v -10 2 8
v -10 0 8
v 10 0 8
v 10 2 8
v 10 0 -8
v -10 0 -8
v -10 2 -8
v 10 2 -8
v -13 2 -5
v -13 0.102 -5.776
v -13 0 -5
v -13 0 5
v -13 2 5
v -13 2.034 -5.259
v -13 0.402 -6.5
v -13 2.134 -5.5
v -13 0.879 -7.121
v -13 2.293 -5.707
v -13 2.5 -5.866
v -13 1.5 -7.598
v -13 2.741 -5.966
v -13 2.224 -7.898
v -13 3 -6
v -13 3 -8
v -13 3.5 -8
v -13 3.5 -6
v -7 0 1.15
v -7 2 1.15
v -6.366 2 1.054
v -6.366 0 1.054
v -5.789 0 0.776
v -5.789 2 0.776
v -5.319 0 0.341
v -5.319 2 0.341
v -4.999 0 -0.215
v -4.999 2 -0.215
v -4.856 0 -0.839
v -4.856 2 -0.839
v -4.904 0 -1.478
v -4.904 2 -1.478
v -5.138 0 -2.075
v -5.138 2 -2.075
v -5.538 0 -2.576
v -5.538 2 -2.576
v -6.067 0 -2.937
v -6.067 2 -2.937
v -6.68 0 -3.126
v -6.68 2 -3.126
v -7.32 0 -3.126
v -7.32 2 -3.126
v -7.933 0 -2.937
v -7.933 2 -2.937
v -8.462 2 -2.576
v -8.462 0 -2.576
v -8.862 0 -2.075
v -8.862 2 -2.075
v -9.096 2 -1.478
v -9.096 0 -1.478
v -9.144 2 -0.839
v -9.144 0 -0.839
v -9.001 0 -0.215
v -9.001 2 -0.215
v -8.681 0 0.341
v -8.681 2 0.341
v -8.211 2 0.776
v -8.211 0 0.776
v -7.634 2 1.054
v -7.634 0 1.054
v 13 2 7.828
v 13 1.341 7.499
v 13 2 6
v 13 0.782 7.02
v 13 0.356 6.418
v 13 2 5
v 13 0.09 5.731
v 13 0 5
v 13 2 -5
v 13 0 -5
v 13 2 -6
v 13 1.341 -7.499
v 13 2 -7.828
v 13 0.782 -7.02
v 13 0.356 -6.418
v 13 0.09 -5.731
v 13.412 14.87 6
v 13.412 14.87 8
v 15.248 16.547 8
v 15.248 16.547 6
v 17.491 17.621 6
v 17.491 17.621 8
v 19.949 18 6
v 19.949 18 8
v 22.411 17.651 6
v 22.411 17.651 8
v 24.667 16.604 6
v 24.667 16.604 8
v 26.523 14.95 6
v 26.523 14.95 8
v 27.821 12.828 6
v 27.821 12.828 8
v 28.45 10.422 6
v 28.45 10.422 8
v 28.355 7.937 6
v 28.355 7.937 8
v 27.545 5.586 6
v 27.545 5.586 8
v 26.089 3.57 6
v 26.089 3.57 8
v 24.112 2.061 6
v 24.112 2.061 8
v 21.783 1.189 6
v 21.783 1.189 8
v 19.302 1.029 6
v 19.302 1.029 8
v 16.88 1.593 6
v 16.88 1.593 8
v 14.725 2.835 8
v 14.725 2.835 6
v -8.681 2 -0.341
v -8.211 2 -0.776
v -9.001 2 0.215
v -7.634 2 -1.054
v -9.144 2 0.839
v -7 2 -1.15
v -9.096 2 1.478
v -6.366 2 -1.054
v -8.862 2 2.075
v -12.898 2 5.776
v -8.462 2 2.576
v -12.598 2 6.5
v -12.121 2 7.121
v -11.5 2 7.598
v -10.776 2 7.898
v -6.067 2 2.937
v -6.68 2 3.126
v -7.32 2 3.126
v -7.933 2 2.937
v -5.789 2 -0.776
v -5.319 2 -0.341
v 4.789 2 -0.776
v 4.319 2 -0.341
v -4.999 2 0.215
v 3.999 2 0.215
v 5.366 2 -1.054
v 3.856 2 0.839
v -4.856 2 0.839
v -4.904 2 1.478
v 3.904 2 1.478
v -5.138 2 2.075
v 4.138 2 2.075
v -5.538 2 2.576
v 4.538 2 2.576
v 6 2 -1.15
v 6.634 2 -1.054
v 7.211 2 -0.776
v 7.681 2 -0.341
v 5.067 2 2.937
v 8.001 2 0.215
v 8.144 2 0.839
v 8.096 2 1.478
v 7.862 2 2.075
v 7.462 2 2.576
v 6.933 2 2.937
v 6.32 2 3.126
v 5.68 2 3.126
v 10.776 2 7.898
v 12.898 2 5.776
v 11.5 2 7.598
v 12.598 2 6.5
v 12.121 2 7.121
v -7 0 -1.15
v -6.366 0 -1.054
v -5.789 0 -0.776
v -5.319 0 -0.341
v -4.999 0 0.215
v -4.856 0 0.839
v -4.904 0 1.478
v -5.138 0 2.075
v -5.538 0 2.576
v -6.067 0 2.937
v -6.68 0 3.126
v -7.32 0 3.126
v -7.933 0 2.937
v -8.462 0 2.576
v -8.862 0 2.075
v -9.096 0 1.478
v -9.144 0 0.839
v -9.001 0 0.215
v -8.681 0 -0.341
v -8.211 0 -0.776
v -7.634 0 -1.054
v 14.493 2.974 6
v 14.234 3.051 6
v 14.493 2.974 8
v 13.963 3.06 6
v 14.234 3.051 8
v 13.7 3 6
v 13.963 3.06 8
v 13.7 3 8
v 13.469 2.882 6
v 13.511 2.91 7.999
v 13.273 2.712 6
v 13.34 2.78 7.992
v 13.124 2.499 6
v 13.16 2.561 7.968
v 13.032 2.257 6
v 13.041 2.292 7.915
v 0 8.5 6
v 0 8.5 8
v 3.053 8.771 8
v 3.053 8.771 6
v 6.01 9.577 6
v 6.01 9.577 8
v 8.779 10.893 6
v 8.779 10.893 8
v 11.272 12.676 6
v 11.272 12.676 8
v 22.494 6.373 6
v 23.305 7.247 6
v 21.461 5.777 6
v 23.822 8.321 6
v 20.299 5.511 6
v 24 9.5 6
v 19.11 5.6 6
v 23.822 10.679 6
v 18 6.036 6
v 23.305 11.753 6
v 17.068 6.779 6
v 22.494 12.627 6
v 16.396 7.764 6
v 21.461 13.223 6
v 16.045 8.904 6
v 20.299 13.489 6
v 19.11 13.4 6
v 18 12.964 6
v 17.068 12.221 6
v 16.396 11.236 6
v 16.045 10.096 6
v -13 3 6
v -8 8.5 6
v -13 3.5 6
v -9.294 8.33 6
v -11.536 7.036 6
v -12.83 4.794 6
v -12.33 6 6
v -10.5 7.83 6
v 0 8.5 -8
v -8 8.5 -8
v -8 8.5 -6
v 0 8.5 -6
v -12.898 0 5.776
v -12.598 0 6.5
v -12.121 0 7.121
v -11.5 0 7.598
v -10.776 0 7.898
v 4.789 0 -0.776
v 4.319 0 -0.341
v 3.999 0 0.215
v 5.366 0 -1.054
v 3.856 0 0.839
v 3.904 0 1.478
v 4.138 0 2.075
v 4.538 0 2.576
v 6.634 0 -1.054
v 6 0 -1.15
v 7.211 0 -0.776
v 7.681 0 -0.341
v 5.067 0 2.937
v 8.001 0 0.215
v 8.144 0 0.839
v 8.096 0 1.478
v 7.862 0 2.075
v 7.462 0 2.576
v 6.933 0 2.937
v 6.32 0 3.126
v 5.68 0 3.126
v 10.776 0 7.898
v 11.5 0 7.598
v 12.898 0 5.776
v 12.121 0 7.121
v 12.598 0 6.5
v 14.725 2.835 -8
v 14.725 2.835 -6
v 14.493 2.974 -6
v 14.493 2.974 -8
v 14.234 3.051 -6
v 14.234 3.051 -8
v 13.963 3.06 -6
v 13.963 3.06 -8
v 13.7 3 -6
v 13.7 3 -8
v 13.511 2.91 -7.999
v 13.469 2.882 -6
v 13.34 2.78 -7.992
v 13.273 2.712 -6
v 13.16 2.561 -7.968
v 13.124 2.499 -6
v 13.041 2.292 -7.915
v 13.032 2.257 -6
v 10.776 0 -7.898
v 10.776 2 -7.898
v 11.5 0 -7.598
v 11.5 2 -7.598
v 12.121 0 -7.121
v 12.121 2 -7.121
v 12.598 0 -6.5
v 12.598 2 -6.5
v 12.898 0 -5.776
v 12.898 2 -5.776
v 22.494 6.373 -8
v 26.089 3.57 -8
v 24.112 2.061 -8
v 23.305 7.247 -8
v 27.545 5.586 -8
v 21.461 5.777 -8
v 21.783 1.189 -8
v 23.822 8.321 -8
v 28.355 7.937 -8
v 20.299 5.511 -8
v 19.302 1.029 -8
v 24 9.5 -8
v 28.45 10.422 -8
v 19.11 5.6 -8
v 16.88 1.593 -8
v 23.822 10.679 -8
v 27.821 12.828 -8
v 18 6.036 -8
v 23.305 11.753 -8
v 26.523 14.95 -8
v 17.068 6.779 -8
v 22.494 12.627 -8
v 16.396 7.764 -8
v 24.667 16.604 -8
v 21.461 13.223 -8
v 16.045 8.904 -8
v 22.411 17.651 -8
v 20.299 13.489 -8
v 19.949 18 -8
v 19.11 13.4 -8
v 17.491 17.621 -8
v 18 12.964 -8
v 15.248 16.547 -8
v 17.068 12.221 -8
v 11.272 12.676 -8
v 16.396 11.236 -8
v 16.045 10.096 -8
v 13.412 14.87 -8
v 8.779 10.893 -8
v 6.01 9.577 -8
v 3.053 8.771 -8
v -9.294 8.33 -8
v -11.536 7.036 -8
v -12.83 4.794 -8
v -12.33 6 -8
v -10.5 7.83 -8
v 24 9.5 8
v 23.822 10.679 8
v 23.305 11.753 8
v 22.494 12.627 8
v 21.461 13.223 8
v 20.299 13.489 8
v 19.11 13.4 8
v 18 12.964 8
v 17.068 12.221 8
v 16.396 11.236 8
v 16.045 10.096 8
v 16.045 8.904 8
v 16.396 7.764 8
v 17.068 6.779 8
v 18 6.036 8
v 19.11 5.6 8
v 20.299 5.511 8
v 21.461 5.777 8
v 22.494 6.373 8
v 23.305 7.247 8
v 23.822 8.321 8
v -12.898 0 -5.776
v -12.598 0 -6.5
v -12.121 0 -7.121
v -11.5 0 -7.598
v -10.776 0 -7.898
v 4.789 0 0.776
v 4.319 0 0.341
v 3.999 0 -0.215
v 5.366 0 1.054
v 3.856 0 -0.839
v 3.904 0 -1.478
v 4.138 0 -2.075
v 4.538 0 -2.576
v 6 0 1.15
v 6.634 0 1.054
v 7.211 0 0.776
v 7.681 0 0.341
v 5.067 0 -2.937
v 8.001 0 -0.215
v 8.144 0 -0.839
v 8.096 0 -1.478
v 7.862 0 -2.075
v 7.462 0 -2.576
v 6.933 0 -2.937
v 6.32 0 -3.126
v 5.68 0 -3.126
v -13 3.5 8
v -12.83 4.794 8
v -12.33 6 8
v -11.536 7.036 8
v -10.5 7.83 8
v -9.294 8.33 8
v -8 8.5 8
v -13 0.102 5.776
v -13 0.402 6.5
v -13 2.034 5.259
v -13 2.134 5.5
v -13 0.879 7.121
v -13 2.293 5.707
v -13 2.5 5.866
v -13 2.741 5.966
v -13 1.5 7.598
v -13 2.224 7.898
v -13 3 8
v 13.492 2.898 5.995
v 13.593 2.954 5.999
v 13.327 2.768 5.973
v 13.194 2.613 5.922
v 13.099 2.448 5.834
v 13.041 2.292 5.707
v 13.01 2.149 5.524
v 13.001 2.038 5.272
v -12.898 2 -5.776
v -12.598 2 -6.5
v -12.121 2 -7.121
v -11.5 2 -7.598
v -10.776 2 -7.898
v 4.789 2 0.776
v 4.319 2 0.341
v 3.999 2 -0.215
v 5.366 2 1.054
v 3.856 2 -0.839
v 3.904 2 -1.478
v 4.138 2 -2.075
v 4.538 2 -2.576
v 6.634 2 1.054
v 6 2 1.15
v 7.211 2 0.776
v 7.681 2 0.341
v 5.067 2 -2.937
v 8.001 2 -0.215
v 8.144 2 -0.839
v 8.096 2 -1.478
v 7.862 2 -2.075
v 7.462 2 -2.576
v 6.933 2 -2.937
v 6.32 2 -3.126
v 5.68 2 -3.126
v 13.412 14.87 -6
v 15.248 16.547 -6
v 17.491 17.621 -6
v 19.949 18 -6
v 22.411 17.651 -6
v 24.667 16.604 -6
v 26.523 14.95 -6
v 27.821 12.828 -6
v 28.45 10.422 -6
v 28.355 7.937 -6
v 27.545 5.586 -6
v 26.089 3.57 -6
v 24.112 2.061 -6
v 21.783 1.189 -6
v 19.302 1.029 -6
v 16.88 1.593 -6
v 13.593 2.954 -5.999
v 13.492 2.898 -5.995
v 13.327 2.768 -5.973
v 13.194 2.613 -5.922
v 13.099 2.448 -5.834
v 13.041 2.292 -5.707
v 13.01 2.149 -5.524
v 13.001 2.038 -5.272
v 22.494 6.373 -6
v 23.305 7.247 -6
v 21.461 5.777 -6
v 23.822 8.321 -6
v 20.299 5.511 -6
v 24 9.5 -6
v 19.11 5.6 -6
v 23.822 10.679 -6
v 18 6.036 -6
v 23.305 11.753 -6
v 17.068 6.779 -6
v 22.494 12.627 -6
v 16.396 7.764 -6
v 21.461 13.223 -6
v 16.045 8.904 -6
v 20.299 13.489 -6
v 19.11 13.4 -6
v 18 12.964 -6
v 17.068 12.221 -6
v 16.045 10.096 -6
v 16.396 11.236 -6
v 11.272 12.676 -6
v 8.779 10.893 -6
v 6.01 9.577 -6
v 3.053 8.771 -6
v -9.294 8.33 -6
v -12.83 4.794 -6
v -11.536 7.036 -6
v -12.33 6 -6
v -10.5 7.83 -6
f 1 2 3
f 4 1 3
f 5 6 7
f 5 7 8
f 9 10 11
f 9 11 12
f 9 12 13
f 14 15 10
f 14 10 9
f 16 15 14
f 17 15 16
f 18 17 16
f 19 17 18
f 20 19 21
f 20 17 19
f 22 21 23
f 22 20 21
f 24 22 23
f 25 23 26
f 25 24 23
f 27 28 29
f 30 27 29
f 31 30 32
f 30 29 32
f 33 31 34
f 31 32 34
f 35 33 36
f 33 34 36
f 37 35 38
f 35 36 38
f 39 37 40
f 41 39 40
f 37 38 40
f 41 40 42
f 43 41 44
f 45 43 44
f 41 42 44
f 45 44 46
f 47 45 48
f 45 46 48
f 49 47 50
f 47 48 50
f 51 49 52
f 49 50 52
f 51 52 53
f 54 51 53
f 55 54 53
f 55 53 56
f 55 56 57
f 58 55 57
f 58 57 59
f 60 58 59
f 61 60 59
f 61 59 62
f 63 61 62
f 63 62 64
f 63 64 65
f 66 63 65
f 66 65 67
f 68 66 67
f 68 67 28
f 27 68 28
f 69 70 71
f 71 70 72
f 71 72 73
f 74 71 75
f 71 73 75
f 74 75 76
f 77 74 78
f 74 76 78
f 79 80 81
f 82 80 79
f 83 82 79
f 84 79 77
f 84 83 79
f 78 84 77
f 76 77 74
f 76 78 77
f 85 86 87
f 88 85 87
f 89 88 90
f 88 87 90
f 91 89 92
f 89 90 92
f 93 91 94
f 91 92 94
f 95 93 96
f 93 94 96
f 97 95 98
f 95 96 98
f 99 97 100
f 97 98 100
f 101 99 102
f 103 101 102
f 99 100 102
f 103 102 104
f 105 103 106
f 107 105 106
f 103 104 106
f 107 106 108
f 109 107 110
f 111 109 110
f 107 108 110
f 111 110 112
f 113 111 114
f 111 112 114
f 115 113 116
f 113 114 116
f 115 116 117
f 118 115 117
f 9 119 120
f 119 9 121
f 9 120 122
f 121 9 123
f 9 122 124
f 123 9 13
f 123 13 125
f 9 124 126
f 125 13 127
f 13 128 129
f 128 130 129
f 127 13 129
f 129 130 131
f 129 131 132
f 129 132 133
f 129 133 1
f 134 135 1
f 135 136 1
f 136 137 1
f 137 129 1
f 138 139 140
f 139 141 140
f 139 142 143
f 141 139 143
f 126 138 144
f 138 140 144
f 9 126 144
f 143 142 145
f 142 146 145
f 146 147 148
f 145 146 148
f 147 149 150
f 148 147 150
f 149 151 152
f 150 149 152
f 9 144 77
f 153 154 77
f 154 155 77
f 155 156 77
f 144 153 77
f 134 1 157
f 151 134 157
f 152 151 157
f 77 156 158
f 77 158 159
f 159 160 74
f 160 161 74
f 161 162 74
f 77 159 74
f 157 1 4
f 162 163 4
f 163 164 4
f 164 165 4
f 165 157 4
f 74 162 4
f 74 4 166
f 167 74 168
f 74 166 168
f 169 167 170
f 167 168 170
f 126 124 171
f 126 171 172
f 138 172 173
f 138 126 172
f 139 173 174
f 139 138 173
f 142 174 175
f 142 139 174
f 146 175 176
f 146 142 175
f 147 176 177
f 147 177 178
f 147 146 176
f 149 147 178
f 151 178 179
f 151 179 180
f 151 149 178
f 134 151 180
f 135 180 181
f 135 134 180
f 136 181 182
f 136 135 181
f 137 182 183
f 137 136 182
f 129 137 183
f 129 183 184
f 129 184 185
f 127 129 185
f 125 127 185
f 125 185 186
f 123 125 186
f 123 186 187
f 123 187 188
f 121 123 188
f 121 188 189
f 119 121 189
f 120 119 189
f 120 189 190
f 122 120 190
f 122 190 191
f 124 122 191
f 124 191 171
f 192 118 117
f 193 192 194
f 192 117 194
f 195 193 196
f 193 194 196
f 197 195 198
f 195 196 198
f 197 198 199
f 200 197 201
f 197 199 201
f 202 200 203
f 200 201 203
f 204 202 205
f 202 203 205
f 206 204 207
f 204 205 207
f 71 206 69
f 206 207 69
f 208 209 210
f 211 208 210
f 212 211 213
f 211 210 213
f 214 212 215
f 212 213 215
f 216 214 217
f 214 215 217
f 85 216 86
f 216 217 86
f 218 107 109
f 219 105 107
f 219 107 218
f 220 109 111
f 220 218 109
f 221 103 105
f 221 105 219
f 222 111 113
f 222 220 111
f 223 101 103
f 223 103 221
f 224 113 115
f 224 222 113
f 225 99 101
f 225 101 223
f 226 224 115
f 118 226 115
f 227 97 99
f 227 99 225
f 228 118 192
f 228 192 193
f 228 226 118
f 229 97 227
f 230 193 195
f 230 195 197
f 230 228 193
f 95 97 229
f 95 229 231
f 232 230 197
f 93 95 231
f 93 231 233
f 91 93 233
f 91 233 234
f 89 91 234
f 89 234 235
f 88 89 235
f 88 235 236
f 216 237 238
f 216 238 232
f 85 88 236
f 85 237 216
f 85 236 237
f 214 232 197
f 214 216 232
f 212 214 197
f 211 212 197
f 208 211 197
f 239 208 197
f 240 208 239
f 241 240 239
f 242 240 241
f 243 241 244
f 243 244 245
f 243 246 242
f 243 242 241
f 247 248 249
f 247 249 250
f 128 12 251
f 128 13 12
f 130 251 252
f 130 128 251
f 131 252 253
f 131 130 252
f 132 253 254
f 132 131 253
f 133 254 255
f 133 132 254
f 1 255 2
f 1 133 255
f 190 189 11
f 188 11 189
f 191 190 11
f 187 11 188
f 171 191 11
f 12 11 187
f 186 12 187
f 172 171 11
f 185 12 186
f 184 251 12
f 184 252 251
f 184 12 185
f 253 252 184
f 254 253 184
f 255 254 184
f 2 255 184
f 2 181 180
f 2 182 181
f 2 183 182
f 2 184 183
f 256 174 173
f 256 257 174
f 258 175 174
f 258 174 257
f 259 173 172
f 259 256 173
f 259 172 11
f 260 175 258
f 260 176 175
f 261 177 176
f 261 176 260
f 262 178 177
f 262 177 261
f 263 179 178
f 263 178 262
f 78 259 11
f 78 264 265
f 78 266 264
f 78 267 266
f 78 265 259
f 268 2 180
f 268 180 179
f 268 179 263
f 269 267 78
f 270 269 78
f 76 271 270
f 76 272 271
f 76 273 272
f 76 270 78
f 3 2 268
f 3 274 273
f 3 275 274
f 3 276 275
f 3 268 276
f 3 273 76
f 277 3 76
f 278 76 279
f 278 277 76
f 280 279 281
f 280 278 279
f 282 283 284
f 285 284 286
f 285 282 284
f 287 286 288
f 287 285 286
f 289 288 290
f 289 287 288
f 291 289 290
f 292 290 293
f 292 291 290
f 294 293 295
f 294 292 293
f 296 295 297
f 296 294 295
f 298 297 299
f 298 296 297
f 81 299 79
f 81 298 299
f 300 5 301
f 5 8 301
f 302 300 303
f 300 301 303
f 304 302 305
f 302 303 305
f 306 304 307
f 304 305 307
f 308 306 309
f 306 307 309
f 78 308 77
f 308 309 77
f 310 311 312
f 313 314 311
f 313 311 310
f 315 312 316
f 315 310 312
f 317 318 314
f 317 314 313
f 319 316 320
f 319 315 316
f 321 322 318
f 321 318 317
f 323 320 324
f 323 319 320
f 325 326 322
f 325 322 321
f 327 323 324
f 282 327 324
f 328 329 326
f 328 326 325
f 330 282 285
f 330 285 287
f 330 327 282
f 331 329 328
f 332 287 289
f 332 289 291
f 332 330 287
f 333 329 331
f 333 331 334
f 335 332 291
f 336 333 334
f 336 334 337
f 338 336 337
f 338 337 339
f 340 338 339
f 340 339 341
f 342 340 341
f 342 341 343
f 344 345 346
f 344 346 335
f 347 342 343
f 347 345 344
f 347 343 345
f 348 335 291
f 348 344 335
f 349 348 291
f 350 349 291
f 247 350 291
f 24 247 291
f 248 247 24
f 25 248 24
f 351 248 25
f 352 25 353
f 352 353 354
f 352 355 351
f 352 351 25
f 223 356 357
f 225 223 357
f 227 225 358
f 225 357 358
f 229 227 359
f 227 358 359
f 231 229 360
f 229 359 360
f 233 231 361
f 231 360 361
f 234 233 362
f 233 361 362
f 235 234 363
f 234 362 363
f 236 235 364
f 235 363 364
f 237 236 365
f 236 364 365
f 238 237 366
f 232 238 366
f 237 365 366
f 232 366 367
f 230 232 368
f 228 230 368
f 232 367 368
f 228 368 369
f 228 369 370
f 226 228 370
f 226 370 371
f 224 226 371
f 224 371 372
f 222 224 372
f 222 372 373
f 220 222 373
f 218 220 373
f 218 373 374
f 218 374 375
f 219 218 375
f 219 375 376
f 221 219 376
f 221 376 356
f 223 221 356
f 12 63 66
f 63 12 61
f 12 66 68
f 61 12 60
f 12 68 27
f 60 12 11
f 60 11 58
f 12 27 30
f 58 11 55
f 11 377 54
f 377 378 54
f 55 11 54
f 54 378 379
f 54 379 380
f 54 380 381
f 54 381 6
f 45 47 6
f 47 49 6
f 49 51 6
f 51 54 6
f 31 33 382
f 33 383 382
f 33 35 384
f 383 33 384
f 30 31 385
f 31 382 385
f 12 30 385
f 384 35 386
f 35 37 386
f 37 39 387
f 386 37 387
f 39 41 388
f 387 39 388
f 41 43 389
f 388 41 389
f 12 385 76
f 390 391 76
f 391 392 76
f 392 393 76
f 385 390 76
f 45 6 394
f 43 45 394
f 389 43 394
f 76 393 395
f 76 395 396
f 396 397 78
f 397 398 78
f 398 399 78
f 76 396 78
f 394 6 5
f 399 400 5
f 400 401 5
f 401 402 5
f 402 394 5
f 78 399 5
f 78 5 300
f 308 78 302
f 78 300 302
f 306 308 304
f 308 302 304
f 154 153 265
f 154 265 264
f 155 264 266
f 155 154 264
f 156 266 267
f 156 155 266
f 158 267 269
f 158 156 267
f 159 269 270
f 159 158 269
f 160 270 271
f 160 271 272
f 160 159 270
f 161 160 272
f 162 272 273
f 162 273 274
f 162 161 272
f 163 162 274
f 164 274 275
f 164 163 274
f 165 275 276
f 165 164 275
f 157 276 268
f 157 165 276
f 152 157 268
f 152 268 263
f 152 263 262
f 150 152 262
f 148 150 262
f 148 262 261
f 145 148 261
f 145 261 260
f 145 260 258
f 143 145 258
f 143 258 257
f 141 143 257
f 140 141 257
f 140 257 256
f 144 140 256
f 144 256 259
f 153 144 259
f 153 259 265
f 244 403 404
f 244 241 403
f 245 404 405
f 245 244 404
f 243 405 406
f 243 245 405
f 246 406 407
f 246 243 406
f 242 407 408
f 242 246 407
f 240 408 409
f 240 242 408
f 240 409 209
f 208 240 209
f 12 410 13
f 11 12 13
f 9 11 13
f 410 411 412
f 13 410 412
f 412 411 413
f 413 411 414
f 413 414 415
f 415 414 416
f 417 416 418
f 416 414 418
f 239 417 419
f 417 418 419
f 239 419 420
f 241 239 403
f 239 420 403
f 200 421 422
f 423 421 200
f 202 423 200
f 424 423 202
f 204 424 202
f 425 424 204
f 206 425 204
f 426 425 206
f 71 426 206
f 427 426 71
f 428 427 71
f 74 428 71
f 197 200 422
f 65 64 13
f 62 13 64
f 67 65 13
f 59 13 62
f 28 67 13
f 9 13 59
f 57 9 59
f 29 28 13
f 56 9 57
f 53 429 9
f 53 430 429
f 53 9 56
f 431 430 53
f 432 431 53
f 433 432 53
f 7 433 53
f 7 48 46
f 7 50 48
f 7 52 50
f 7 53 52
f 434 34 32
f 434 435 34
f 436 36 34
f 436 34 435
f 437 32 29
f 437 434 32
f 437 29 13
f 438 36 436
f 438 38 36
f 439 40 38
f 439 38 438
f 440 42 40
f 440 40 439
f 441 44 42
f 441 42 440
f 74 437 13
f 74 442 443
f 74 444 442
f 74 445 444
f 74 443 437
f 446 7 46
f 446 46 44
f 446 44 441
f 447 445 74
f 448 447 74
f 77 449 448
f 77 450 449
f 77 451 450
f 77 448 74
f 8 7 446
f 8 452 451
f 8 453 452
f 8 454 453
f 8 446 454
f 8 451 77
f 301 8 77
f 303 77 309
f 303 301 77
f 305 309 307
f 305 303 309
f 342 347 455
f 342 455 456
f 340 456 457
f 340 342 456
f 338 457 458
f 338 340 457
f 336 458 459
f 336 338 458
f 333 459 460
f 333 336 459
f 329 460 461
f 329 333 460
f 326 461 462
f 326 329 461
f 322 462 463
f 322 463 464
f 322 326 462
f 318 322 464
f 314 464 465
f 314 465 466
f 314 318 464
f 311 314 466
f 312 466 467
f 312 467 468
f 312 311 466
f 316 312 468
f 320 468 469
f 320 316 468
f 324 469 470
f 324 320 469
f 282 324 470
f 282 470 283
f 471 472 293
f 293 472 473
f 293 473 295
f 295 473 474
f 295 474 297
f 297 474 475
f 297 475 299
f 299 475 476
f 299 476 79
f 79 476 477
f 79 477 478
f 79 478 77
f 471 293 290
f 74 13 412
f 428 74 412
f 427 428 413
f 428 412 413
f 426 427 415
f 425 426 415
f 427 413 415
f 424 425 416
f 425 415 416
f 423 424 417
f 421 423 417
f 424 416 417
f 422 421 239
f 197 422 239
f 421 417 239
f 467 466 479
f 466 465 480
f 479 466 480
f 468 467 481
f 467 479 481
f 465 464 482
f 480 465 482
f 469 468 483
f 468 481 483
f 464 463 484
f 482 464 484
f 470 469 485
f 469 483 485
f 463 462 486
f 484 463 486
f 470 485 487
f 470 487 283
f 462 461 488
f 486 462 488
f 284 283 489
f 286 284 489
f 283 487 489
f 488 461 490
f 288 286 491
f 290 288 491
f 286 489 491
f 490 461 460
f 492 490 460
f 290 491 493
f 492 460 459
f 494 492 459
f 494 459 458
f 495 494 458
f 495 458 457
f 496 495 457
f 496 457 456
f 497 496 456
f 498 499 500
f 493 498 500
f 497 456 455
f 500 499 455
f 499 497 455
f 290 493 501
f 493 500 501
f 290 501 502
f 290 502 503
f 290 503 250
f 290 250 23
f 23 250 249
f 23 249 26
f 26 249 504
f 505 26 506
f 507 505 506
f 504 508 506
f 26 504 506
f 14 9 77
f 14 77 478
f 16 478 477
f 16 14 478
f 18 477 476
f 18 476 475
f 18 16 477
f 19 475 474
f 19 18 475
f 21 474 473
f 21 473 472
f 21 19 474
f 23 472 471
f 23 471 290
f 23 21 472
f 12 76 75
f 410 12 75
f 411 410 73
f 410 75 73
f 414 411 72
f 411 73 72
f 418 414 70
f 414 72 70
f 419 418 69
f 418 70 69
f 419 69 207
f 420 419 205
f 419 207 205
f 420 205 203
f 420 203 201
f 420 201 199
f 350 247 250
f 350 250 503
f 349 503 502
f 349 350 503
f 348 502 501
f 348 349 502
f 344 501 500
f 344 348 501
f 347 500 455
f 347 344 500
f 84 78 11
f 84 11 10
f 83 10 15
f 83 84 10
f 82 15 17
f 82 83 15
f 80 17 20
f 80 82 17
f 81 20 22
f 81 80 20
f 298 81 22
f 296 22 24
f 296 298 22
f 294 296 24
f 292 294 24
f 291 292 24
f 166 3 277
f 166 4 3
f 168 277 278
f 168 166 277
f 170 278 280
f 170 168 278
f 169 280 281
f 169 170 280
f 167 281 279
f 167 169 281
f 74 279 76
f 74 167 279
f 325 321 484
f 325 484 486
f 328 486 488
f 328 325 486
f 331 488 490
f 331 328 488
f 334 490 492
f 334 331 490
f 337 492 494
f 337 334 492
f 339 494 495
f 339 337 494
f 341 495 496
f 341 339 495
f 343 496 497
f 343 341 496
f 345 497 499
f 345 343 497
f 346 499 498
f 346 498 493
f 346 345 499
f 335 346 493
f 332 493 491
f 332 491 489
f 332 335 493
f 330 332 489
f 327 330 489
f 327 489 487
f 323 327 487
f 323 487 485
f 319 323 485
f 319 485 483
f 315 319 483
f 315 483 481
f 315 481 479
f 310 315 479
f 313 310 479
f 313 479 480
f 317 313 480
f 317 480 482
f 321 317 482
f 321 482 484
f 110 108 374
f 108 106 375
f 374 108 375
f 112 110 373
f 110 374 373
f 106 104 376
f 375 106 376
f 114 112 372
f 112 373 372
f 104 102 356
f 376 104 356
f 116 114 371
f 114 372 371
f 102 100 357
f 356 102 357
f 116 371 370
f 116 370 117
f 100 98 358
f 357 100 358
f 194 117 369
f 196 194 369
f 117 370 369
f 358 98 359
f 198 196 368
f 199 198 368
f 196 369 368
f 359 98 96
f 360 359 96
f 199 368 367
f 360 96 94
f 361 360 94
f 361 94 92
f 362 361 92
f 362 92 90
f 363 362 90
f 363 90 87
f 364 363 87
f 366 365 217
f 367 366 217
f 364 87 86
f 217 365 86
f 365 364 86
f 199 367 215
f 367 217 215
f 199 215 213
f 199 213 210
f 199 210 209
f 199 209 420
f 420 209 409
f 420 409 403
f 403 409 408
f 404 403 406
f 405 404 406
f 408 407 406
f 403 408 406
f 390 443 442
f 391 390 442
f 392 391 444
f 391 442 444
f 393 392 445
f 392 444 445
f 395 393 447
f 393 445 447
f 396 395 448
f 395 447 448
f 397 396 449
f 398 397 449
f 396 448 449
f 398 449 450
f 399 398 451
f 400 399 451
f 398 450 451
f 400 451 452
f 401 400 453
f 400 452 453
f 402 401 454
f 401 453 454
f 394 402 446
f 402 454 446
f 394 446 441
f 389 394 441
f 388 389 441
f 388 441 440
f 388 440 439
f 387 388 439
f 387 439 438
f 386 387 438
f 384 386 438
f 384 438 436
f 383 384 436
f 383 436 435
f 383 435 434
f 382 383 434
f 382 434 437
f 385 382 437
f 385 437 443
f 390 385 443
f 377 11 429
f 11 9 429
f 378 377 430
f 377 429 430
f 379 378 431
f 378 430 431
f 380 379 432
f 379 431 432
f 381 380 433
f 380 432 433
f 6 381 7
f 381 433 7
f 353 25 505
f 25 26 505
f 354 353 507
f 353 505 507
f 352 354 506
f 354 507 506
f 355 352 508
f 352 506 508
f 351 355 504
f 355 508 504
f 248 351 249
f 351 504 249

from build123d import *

# Parameters (mm, degrees)
SKETCH_1_W          = 26
SKETCH_1_H          = 16
EXTRUDE_1_DEPTH     = 2
EXTRUDE_2_DEPTH     = 2
FILLET_1_R          = 5
FILLET_2_R          = 3
SKETCH_4_R          = 4
CUT_EXTRUDE_1_DEPTH = 38.312866414
SKETCH_5_R          = 2.15
CUT_EXTRUDE_2_DEPTH = 34.648922717
FILLET_3_R          = 3
FILLET_START        = -13
FILLET_4_DEPTH      = 26.69955789
FILLET_START_2      = 4
FILLET_4_2_DEPTH    = 2


with BuildPart() as part:
    # 草图1 → 凸台-拉伸1 (new body)
    with BuildSketch(Plane(origin=(0, 0, 0), x_dir=(1, 0, 0), z_dir=(0, 1, 0))):
        Rectangle(SKETCH_1_W, SKETCH_1_H)
    extrude(amount=EXTRUDE_1_DEPTH)

    # 草图3 → 凸台-拉伸2 (add)
    with BuildSketch(Plane.XY.offset(8)):
        with BuildLine():
            Line((-13, 2), (-13, 8.5))
            Line((-13, 8.5), (0, 8.5))
            ThreePointArc((0, 8.5), (7.423811989, 10.173553708), (13.411524732, 14.870474248))
            ThreePointArc((13.411524732, 14.870474248), (28.449822139, 10.422228722), (14.725126476, 2.834738617))
            ThreePointArc((14.725126476, 2.834738617), (13.600854496, 2.958234042), (13, 2))
            Line((13, 2), (-13, 2))
        make_face()
    extrude(amount=-EXTRUDE_2_DEPTH)

    # 圆角1
    fillet_1_edges = [part.edges().sort_by_distance(p)[0] for p in [
        (-13, 8.5, 7),
    ]]
    fillet(fillet_1_edges, radius=FILLET_1_R)

    # 圆角2
    fillet_2_edges = [part.edges().sort_by_distance(p)[0] for p in [
        (-13, 1, -8),
        (13, 1, -8),
    ]]
    fillet(fillet_2_edges, radius=FILLET_2_R)

    # 草图4 → 切除-拉伸1 (cut, through all)
    with BuildSketch(Plane.XY.offset(8)):
        with Locations((20, 9.5)):
            Circle(SKETCH_4_R)
    extrude(amount=-CUT_EXTRUDE_1_DEPTH, mode=Mode.SUBTRACT)

    # 草图5 → 切除-拉伸2 (cut, through all)
    with BuildSketch(Plane(origin=(0, 2, 0), x_dir=(1, 0, 0), z_dir=(0, 1, 0))):
        with Locations(Location((-7, 1, 0), (0, 0, 270))):
            Circle(SKETCH_5_R)
        with Locations(Location((6, 1, 0), (0, 0, 270))):
            Circle(SKETCH_5_R)
    extrude(amount=-CUT_EXTRUDE_2_DEPTH, mode=Mode.SUBTRACT)

    # 圆角3
    fillet_3_edges = [part.edges().sort_by_distance(p)[0] for p in [
        (0, 0, 8),
    ]]
    fillet(fillet_3_edges, radius=FILLET_3_R)

    # 圆角4: read off the stored shape, not the designer's step
    # 圆角4 outline → 圆角4 (add)
    with BuildSketch(Plane.YZ.offset(FILLET_START)):
        with BuildLine():
            ThreePointArc((2, 5), (2.292893219, 5.707106781), (3, 6))
            Line((3, 6), (2, 6))
            Line((2, 6), (2, 5))
        make_face()
    extrude(amount=FILLET_4_DEPTH)

    # Fillet 4 2 outline → Fillet 4 2 (cut)
    with BuildSketch(Plane.XY.offset(FILLET_START_2)):
        with BuildLine():
            Line((13.69955789, 2), (13.699557878, 3.000000032))
            ThreePointArc((13.699557878, 3.000000032), (13.19224914, 2.610200695), (13, 1.999999133))
            Line((13, 1.999999133), (13.69955789, 2))
        make_face()
    extrude(amount=FILLET_4_2_DEPTH, mode=Mode.SUBTRACT)


with BuildPart() as body_2:
    # 镜向1: mirrored copy
    add(part.part.mirror(Plane.XY))


solid = Compound([part.part, body_2.part])
